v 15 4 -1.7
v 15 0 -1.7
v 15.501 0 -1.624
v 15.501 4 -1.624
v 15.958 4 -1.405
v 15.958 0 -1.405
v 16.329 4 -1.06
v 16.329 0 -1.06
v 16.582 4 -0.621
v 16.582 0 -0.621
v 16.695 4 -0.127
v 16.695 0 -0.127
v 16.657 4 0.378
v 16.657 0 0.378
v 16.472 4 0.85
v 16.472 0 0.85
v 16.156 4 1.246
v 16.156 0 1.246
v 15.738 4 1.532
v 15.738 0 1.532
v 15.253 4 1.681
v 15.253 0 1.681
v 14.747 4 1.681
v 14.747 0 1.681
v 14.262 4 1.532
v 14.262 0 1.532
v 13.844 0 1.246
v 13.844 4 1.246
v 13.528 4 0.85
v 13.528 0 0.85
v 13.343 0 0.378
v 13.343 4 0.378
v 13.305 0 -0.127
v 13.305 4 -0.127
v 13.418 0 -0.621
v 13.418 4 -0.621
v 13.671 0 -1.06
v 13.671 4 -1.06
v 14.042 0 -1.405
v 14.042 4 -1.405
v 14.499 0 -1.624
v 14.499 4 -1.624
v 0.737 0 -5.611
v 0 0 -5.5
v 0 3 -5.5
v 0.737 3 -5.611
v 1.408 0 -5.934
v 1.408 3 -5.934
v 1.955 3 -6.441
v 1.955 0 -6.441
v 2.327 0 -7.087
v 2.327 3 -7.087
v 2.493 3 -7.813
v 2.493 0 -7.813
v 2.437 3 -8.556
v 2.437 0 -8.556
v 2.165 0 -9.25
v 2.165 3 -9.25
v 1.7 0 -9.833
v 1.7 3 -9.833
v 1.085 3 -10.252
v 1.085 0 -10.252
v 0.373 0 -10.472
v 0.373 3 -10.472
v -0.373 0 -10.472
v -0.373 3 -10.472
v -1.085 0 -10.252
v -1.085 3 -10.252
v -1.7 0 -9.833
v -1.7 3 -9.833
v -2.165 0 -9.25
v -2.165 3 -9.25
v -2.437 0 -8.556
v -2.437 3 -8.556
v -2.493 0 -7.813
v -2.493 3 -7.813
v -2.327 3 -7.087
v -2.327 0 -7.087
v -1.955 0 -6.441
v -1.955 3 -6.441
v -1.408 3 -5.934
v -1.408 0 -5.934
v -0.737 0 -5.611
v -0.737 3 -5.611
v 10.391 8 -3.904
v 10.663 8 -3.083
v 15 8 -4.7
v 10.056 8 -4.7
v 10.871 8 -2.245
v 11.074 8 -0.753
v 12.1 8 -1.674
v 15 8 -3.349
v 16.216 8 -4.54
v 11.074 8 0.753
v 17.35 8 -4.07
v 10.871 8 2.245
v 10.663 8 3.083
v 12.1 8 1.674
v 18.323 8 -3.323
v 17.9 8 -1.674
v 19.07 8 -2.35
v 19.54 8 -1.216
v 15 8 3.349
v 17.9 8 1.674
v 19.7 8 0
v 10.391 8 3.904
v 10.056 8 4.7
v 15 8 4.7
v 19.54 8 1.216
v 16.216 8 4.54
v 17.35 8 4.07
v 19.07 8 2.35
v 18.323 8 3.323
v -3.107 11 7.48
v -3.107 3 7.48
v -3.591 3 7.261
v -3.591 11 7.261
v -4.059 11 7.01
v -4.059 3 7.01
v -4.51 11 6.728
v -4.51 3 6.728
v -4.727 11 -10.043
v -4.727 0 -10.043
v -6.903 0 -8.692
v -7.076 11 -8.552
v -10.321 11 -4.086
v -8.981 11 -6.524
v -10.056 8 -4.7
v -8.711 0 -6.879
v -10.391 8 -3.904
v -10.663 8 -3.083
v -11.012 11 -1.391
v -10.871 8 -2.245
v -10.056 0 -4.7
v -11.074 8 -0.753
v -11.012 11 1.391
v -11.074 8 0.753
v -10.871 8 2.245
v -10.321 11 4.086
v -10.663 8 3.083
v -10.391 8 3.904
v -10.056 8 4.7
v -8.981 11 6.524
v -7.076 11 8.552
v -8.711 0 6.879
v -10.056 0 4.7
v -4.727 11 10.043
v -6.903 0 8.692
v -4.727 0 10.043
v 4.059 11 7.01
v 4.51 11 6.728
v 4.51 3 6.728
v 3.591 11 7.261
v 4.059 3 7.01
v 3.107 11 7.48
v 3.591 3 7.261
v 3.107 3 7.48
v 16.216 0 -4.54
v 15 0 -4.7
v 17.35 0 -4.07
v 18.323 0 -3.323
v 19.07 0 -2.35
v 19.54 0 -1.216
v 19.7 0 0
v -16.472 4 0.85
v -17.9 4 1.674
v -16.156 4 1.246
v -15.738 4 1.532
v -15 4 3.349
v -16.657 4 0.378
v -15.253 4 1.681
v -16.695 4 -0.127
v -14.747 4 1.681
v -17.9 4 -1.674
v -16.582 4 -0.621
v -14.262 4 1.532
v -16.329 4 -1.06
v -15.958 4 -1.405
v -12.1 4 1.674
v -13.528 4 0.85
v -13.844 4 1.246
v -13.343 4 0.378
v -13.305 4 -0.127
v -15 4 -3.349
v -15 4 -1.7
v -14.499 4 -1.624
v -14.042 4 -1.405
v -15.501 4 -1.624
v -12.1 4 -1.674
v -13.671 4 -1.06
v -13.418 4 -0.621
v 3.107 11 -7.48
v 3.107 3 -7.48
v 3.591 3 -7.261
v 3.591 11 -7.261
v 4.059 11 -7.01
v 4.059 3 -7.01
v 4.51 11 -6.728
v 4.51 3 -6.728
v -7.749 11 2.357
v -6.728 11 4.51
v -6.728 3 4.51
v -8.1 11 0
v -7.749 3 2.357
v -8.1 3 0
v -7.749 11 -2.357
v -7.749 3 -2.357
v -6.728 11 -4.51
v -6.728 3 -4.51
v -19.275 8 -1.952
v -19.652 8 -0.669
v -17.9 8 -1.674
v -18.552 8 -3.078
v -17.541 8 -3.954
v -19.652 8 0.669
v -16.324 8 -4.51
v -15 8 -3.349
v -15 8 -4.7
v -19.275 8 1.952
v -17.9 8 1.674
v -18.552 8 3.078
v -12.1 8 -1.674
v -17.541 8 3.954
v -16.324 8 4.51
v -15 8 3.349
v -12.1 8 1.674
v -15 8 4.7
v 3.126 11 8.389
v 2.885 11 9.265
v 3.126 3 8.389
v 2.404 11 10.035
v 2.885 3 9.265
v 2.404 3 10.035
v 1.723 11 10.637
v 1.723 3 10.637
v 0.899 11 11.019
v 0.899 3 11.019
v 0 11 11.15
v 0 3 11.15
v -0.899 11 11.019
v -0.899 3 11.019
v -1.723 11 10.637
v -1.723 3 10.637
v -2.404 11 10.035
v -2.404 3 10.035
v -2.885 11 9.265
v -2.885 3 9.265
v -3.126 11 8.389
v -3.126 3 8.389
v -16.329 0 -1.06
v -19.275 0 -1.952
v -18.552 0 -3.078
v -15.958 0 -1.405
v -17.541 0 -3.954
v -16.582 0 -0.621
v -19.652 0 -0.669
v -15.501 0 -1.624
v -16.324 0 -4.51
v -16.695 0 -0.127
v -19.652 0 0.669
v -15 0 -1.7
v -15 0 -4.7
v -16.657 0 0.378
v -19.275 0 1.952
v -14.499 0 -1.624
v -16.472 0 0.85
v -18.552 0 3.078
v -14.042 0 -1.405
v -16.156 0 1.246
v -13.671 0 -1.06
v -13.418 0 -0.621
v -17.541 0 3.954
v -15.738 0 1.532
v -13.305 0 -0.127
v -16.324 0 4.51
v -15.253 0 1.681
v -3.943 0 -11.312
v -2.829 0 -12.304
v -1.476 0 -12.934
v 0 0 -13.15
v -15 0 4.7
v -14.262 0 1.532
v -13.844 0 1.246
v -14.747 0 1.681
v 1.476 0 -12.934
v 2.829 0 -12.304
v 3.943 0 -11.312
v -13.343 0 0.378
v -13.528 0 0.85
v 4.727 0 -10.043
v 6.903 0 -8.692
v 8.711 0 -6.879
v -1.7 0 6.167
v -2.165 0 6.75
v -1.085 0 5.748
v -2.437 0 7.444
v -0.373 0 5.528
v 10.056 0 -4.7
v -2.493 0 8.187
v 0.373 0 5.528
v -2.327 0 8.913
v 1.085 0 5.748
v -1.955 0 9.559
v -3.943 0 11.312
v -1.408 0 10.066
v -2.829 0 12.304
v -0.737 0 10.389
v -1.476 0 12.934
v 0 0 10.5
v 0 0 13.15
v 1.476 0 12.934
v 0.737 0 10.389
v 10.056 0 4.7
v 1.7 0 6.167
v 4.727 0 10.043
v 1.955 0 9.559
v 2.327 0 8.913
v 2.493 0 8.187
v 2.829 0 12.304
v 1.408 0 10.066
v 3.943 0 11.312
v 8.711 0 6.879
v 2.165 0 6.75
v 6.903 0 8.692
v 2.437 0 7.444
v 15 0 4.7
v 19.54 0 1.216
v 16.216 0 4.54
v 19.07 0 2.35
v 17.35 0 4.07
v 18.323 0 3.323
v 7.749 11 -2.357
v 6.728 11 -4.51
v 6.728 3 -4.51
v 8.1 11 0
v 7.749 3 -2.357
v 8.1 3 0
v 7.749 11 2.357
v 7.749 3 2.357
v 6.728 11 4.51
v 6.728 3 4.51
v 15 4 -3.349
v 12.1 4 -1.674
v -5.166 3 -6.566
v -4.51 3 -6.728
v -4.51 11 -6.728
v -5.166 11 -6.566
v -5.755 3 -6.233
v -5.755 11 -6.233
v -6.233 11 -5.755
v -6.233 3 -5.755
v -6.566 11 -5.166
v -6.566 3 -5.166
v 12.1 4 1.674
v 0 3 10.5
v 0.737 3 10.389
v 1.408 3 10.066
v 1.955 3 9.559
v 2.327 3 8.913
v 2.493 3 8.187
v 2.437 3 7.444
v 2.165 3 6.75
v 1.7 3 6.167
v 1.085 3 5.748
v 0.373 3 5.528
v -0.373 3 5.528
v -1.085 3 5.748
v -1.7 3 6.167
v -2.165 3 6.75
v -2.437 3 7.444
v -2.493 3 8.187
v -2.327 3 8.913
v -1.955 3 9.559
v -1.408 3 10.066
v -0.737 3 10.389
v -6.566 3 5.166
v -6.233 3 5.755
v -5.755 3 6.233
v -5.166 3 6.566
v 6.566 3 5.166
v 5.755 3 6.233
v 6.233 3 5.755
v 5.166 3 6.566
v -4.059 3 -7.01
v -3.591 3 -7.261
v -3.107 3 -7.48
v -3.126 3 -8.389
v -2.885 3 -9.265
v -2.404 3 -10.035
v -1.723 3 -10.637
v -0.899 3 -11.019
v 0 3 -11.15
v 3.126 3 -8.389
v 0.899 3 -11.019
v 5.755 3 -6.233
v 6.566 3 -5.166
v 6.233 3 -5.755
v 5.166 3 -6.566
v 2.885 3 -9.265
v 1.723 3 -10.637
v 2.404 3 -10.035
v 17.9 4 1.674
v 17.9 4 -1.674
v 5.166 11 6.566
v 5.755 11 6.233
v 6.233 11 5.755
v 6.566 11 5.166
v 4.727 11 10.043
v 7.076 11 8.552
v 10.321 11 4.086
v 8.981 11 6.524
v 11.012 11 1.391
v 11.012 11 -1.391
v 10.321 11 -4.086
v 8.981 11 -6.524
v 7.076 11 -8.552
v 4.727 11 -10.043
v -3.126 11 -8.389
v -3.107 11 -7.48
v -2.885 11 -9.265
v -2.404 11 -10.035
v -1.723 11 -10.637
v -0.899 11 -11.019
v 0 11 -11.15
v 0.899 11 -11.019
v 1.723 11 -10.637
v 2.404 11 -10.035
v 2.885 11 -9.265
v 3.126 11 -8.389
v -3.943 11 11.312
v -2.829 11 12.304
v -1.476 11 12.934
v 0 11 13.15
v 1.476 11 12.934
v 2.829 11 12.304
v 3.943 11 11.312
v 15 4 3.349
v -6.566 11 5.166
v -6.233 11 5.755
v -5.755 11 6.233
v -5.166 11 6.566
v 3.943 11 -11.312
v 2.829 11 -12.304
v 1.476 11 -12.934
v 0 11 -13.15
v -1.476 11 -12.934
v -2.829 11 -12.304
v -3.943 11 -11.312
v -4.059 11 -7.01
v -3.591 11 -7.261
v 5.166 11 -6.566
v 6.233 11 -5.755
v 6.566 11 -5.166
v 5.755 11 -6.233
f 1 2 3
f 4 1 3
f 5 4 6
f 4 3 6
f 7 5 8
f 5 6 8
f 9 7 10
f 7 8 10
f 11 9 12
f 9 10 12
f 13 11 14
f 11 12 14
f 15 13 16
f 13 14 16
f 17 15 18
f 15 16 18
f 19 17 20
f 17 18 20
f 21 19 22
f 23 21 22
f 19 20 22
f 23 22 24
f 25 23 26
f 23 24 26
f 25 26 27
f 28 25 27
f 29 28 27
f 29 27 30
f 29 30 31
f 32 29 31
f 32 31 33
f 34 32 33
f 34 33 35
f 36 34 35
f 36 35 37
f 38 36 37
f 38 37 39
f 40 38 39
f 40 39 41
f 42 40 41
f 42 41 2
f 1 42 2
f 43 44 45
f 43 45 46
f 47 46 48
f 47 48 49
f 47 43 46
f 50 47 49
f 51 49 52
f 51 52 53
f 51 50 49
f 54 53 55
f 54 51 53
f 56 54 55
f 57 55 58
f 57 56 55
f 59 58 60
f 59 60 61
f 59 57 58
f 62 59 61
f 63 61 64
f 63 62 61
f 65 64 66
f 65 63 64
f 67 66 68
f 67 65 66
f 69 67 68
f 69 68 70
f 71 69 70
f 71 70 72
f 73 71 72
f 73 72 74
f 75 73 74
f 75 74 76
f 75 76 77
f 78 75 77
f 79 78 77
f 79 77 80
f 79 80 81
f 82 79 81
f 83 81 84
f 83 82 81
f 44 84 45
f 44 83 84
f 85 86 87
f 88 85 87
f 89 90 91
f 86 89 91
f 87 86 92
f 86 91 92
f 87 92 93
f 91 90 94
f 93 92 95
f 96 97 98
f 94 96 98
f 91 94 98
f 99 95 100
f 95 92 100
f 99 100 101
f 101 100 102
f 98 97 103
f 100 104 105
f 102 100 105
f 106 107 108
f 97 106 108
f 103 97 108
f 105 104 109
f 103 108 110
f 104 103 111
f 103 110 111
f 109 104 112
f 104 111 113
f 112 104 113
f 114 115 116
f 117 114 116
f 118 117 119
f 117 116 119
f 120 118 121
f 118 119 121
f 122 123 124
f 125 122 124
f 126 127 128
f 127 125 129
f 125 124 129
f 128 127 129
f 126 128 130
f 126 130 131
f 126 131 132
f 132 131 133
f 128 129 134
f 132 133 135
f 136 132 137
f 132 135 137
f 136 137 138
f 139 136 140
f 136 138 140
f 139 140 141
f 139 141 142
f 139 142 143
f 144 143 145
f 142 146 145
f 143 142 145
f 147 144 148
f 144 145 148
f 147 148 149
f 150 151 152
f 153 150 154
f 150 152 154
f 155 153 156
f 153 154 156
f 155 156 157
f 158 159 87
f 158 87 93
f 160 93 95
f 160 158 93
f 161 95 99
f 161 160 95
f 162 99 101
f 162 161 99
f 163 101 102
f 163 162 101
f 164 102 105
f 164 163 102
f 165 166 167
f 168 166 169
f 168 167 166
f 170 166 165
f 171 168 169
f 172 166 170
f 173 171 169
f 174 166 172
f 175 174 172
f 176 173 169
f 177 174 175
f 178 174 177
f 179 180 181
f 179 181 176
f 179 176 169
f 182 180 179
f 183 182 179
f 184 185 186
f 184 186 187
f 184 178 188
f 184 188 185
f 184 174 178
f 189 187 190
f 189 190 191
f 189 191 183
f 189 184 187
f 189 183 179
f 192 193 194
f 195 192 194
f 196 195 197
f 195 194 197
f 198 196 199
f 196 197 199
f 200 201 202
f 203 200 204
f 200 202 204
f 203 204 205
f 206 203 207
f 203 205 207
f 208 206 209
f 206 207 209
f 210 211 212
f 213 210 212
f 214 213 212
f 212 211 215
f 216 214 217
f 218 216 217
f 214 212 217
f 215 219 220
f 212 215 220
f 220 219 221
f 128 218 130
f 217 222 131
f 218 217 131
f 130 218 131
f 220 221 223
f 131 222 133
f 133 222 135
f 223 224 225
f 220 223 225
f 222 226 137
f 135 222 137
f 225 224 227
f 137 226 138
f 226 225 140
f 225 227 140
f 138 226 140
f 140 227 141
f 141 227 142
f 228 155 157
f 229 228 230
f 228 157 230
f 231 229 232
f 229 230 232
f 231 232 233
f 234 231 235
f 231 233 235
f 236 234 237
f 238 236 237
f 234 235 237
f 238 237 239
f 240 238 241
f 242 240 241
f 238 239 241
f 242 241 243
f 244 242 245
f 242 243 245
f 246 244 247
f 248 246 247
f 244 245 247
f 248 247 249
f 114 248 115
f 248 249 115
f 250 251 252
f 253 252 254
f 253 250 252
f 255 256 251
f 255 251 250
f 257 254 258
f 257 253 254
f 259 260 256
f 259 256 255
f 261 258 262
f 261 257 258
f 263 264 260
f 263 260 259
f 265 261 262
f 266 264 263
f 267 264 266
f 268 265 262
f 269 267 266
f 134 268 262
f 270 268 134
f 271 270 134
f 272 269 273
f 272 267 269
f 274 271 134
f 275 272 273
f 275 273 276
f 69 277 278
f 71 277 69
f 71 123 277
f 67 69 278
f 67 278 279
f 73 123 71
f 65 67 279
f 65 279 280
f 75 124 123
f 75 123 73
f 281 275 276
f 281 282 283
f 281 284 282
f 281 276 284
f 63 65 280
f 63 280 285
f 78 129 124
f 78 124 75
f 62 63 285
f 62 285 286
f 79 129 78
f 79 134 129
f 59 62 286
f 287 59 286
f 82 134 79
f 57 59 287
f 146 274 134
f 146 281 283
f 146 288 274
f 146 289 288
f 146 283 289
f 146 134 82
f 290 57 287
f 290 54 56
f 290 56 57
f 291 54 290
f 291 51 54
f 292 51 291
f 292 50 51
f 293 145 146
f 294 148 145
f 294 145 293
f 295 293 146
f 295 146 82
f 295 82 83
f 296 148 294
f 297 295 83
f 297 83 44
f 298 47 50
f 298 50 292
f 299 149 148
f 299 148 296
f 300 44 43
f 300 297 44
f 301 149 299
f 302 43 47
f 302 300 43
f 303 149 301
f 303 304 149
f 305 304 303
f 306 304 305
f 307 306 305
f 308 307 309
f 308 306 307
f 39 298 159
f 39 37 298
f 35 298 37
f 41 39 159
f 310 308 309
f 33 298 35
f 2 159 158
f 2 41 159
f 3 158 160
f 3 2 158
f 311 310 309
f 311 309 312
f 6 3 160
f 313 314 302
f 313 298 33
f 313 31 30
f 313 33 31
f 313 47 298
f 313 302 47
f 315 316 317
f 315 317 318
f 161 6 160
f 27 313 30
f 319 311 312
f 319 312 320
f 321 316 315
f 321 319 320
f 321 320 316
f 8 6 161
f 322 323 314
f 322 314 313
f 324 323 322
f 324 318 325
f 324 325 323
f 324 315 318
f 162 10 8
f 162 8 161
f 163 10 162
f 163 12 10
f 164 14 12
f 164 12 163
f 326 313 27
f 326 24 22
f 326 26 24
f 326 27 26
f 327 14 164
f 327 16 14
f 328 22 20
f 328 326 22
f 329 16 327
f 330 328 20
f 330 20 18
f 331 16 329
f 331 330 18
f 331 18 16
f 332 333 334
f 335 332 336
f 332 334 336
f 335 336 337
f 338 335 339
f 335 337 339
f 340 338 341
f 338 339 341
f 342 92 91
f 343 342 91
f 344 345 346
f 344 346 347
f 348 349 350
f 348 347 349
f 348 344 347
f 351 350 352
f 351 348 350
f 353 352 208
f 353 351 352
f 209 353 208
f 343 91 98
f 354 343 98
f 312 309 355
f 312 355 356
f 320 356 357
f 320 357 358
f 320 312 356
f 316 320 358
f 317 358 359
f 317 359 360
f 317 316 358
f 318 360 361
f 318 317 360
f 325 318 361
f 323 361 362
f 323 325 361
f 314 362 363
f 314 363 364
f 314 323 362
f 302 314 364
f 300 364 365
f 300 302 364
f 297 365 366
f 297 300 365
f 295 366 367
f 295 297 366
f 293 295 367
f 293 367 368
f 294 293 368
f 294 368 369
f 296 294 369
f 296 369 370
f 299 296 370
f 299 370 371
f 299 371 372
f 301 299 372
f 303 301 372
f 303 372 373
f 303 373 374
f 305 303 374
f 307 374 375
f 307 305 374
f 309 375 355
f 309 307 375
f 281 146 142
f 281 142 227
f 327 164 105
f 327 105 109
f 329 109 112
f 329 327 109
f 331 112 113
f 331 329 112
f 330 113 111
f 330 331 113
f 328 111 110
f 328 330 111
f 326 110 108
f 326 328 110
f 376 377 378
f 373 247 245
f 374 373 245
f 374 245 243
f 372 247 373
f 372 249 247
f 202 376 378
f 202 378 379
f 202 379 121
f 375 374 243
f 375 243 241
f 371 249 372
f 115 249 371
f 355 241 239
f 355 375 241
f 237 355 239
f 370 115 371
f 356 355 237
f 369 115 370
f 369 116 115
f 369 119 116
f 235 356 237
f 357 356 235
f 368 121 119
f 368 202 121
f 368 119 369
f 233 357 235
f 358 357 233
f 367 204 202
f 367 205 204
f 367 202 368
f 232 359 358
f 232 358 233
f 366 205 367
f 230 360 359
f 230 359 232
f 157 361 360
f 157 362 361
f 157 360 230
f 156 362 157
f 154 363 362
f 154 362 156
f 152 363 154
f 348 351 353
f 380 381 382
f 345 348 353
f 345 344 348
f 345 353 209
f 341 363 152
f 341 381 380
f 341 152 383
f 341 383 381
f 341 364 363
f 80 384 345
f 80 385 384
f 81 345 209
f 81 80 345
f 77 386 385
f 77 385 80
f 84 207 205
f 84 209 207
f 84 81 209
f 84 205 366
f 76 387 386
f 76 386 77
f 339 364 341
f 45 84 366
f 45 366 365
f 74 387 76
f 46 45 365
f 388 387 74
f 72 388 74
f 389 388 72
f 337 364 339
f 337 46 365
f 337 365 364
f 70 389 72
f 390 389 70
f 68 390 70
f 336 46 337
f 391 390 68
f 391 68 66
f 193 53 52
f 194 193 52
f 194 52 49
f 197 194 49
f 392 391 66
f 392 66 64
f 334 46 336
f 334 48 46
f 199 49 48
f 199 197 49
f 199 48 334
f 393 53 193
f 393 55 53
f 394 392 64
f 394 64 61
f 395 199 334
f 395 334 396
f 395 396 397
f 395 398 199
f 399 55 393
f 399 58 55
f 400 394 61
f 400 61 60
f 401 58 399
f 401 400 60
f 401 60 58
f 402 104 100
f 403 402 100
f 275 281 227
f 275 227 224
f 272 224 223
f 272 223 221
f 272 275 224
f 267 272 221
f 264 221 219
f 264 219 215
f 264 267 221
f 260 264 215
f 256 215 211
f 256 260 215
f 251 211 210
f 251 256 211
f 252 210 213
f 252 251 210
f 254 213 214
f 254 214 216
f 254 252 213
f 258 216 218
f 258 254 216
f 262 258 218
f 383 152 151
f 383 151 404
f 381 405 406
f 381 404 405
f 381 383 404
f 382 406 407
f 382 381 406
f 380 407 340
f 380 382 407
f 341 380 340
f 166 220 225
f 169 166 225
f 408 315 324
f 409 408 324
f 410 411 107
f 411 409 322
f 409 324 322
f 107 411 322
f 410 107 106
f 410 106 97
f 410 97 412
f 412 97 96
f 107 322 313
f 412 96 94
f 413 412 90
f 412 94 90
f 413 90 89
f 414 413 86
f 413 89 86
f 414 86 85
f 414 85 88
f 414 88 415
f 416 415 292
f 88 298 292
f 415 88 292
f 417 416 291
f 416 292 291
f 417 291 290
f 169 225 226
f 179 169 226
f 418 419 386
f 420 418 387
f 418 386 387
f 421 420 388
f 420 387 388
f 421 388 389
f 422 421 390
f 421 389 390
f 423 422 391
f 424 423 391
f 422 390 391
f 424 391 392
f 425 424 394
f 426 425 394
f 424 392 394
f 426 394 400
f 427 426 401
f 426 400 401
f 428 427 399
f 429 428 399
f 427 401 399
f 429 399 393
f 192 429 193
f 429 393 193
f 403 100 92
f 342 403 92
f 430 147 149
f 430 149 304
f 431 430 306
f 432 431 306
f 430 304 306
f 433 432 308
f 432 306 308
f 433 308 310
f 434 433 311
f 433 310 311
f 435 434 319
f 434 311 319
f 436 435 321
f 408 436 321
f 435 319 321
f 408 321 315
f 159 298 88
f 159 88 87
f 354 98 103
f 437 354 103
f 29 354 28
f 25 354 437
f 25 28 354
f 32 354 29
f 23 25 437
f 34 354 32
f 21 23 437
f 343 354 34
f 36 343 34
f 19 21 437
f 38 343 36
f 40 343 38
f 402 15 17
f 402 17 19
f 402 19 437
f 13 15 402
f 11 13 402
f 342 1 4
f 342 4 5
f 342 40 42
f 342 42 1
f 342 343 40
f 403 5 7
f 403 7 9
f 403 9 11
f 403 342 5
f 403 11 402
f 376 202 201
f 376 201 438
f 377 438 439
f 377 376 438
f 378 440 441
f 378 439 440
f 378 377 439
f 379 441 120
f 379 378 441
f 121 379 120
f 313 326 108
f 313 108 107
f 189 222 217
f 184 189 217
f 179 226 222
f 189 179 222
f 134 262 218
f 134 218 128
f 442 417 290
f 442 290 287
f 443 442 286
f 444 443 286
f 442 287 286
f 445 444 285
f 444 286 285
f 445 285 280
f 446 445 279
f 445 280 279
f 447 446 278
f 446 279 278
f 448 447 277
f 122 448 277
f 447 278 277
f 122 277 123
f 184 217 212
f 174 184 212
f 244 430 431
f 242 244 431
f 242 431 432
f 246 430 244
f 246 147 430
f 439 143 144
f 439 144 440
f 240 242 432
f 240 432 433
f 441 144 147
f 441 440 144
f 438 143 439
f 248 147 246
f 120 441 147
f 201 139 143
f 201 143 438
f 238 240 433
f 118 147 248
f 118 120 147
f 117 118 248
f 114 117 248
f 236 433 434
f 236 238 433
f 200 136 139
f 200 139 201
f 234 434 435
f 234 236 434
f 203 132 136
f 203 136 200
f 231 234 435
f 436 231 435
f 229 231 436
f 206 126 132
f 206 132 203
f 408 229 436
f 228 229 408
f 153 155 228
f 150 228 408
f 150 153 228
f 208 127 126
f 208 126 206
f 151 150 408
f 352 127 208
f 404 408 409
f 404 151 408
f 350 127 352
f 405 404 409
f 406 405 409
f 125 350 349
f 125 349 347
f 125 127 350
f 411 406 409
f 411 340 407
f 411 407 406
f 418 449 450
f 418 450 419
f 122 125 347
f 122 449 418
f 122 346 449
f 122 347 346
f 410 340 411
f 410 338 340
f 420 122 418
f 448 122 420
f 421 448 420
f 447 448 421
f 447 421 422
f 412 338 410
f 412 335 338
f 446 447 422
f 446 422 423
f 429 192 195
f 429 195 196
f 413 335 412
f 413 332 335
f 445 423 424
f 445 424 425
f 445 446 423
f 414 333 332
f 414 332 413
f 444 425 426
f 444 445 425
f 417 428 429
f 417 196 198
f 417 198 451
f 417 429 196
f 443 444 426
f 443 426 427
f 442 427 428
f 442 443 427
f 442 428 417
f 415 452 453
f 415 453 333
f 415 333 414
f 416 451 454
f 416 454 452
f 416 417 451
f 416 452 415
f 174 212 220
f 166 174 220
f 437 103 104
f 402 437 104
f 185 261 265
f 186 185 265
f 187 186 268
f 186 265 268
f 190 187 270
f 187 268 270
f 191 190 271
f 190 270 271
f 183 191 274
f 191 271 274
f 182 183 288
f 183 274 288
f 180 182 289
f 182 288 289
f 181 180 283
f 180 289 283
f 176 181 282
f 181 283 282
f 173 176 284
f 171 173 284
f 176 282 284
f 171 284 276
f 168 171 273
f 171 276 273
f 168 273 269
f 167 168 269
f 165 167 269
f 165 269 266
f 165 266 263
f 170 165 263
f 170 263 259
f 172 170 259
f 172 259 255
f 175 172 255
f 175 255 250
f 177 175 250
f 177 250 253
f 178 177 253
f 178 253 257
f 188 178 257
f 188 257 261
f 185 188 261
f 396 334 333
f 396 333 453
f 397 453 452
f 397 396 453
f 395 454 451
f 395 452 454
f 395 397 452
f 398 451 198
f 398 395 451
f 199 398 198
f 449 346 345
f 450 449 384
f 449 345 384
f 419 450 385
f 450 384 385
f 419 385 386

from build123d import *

# Parameters (mm, degrees)
SKETCH1_R           = 2.5
BOSS_EXTRUDE1_DEPTH = 3
BOSS_EXTRUDE2_DEPTH = 8
SKETCH4_R           = 1.7
BOSS_EXTRUDE3_DEPTH = 8
CUT_EXTRUDE1_DEPTH  = 4
SKETCH7_R           = 2.5
CUT_EXTRUDE2_DEPTH  = 10


with BuildPart() as part:
    # Sketch1 → Boss-Extrude1 (new body)
    with BuildSketch(Plane(origin=(0, 0, 0), x_dir=(1, 0, 0), z_dir=(0, 1, 0))):
        with BuildLine():
            ThreePointArc((4.727449491, 10.04296875), (0, 13.15), (-4.727449491, 10.04296875))
            ThreePointArc((-4.727449491, 10.04296875), (-11.1, 0), (-4.727449491, -10.04296875))
            ThreePointArc((-4.727449491, -10.04296875), (0, -13.15), (4.727449491, -10.04296875))
            ThreePointArc((4.727449491, -10.04296875), (11.1, 0), (4.727449491, 10.04296875))
        make_face()
        with Locations(Location((0, -8, 0), (0, 0, 270))):
            Circle(SKETCH1_R, mode=Mode.SUBTRACT)
        with Locations(Location((0, 8, 0), (0, 0, 270))):
            Circle(SKETCH1_R, mode=Mode.SUBTRACT)
    extrude(amount=BOSS_EXTRUDE1_DEPTH)

    # Sketch3 → Boss-Extrude2 (add)
    with BuildSketch(Plane(origin=(0, 3, 0), x_dir=(1, 0, 0), z_dir=(0, 1, 0))):
        with BuildLine():
            ThreePointArc((4.727449491, -10.04296875), (11.1, 0), (4.727449491, 10.04296875))
            ThreePointArc((4.727449491, 10.04296875), (0, 13.15), (-4.727449491, 10.04296875))
            ThreePointArc((-4.727449491, 10.04296875), (-11.1, 0), (-4.727449491, -10.04296875))
            ThreePointArc((-4.727449491, -10.04296875), (0, -13.15), (4.727449491, -10.04296875))
        make_face()
        with BuildLine():
            ThreePointArc((3.106861323, 7.48046875), (8.1, 0), (3.106861323, -7.48046875))
            ThreePointArc((3.106861323, -7.48046875), (0, -11.15), (-3.106861323, -7.48046875))
            ThreePointArc((-3.106861323, -7.48046875), (-8.1, 0), (-3.106861323, 7.48046875))
            ThreePointArc((-3.106861323, 7.48046875), (0, 11.15), (3.106861323, 7.48046875))
        make_face(mode=Mode.SUBTRACT)
    extrude(amount=BOSS_EXTRUDE2_DEPTH)

    # Sketch4 → Boss-Extrude3 (add)
    # profile 1 of 8: a face of its own
    with BuildSketch(Plane.XZ):
        with BuildLine():
            Line((10.055844072, -4.7), (15, -4.7))
            ThreePointArc((15, -4.7), (12.597919106, -4.039802889), (10.870666667, -2.244683992))
            ThreePointArc((10.870666667, -2.244683992), (10.53503, -3.496161166), (10.055844072, -4.7))
        make_face()
    # profile 2 of 8: a face of its own
    with BuildSketch(Plane.XZ):
        with BuildLine():
            ThreePointArc((10.870666667, 2.244683992), (12.597919106, 4.039802889), (15, 4.7))
            Line((15, 4.7), (10.055844072, 4.7))
            ThreePointArc((10.055844072, 4.7), (10.53503, 3.496161166), (10.870666667, 2.244683992))
        make_face()
    # profile 3 of 8: a face of its own
    with BuildSketch(Plane.XZ):
        with BuildLine():
            ThreePointArc((10.870666667, -2.244683992), (12.597919106, -4.039802889), (15, -4.7))
            ThreePointArc((15, -4.7), (18.323401872, -3.323401872), (19.7, 0))
            ThreePointArc((19.7, 0), (18.323401872, 3.323401872), (15, 4.7))
            ThreePointArc((15, 4.7), (12.597919106, 4.039802889), (10.870666667, 2.244683992))
            ThreePointArc((10.870666667, 2.244683992), (11.1, 0), (10.870666667, -2.244683992))
        make_face()
        with Locations(Location((15, 0, 0), (0, 0, 270))):
            Circle(SKETCH4_R, mode=Mode.SUBTRACT)
    # profile 4 of 8: a face of its own
    with BuildSketch(Plane.XZ):
        with BuildLine():
            ThreePointArc((-10.870666667, 2.244683992), (-12.597919106, 4.039802889), (-15, 4.7))
            ThreePointArc((-15, 4.7), (-19.7, 0), (-15, -4.7))
            ThreePointArc((-15, -4.7), (-12.597919106, -4.039802889), (-10.870666667, -2.244683992))
            ThreePointArc((-10.870666667, -2.244683992), (-11.1, 0), (-10.870666667, 2.244683992))
        make_face()
        with Locations(Location((-15, 0, 0), (0, 0, 270))):
            Circle(SKETCH4_R, mode=Mode.SUBTRACT)
    # profile 5 of 8: a face of its own
    with BuildSketch(Plane.XZ):
        with BuildLine():
            ThreePointArc((-10.870666667, -2.244683992), (-12.597919106, -4.039802889), (-15, -4.7))
            Line((-15, -4.7), (-10.055844072, -4.7))
            ThreePointArc((-10.055844072, -4.7), (-10.53503, -3.496161166), (-10.870666667, -2.244683992))
        make_face()
    # profile 6 of 8: a face of its own
    with BuildSketch(Plane.XZ):
        with BuildLine():
            Line((-10.055844072, 4.7), (-15, 4.7))
            ThreePointArc((-15, 4.7), (-12.597919106, 4.039802889), (-10.870666667, 2.244683992))
            ThreePointArc((-10.870666667, 2.244683992), (-10.53503, 3.496161166), (-10.055844072, 4.7))
        make_face()
    # profile 7 of 8: a face of its own
    with BuildSketch(Plane.XZ):
        with BuildLine():
            ThreePointArc((-10.3, 0), (-10.444900294, 1.158044328), (-10.870666667, 2.244683992))
            ThreePointArc((-10.870666667, 2.244683992), (-11.1, 0), (-10.870666667, -2.244683992))
            ThreePointArc((-10.870666667, -2.244683992), (-10.444900294, -1.158044328), (-10.3, 0))
        make_face()
    # profile 8 of 8: a face of its own
    with BuildSketch(Plane.XZ):
        with BuildLine():
            ThreePointArc((10.870666667, 2.244683992), (10.3, 0), (10.870666667, -2.244683992))
            ThreePointArc((10.870666667, -2.244683992), (11.1, 0), (10.870666667, 2.244683992))
        make_face()
    extrude(amount=-BOSS_EXTRUDE3_DEPTH)

    # Sketch5 → Cut-Extrude1 (cut)
    with BuildSketch(Plane(origin=(0, 8, 0), x_dir=(1, 0, 0), z_dir=(0, 1, 0))):
        Polygon((-15, -3.348631561), (-12.1, -1.674315781), (-12.1, 1.674315781), (-15, 3.348631561), (-17.9, 1.674315781), (-17.9, -1.674315781), align=None)
        Polygon((15, -3.348631561), (17.9, -1.674315781), (17.9, 1.674315781), (15, 3.348631561), (12.1, 1.674315781), (12.1, -1.674315781), align=None)
    extrude(amount=-CUT_EXTRUDE1_DEPTH, mode=Mode.SUBTRACT)

    # Sketch7 → Cut-Extrude2 (cut)
    with BuildSketch(Plane(origin=(0, 3, 0), x_dir=(1, 0, 0), z_dir=(0, 1, 0))):
        with Locations((4.242640687, 4.242640687)):
            Circle(SKETCH7_R)
        with Locations((4.242640687, -4.242640687)):
            Circle(SKETCH7_R)
        with Locations((-4.242640687, -4.242640687)):
            Circle(SKETCH7_R)
        with Locations((-4.242640687, 4.242640687)):
            Circle(SKETCH7_R)
    extrude(amount=CUT_EXTRUDE2_DEPTH, mode=Mode.SUBTRACT)


solid = part.part
